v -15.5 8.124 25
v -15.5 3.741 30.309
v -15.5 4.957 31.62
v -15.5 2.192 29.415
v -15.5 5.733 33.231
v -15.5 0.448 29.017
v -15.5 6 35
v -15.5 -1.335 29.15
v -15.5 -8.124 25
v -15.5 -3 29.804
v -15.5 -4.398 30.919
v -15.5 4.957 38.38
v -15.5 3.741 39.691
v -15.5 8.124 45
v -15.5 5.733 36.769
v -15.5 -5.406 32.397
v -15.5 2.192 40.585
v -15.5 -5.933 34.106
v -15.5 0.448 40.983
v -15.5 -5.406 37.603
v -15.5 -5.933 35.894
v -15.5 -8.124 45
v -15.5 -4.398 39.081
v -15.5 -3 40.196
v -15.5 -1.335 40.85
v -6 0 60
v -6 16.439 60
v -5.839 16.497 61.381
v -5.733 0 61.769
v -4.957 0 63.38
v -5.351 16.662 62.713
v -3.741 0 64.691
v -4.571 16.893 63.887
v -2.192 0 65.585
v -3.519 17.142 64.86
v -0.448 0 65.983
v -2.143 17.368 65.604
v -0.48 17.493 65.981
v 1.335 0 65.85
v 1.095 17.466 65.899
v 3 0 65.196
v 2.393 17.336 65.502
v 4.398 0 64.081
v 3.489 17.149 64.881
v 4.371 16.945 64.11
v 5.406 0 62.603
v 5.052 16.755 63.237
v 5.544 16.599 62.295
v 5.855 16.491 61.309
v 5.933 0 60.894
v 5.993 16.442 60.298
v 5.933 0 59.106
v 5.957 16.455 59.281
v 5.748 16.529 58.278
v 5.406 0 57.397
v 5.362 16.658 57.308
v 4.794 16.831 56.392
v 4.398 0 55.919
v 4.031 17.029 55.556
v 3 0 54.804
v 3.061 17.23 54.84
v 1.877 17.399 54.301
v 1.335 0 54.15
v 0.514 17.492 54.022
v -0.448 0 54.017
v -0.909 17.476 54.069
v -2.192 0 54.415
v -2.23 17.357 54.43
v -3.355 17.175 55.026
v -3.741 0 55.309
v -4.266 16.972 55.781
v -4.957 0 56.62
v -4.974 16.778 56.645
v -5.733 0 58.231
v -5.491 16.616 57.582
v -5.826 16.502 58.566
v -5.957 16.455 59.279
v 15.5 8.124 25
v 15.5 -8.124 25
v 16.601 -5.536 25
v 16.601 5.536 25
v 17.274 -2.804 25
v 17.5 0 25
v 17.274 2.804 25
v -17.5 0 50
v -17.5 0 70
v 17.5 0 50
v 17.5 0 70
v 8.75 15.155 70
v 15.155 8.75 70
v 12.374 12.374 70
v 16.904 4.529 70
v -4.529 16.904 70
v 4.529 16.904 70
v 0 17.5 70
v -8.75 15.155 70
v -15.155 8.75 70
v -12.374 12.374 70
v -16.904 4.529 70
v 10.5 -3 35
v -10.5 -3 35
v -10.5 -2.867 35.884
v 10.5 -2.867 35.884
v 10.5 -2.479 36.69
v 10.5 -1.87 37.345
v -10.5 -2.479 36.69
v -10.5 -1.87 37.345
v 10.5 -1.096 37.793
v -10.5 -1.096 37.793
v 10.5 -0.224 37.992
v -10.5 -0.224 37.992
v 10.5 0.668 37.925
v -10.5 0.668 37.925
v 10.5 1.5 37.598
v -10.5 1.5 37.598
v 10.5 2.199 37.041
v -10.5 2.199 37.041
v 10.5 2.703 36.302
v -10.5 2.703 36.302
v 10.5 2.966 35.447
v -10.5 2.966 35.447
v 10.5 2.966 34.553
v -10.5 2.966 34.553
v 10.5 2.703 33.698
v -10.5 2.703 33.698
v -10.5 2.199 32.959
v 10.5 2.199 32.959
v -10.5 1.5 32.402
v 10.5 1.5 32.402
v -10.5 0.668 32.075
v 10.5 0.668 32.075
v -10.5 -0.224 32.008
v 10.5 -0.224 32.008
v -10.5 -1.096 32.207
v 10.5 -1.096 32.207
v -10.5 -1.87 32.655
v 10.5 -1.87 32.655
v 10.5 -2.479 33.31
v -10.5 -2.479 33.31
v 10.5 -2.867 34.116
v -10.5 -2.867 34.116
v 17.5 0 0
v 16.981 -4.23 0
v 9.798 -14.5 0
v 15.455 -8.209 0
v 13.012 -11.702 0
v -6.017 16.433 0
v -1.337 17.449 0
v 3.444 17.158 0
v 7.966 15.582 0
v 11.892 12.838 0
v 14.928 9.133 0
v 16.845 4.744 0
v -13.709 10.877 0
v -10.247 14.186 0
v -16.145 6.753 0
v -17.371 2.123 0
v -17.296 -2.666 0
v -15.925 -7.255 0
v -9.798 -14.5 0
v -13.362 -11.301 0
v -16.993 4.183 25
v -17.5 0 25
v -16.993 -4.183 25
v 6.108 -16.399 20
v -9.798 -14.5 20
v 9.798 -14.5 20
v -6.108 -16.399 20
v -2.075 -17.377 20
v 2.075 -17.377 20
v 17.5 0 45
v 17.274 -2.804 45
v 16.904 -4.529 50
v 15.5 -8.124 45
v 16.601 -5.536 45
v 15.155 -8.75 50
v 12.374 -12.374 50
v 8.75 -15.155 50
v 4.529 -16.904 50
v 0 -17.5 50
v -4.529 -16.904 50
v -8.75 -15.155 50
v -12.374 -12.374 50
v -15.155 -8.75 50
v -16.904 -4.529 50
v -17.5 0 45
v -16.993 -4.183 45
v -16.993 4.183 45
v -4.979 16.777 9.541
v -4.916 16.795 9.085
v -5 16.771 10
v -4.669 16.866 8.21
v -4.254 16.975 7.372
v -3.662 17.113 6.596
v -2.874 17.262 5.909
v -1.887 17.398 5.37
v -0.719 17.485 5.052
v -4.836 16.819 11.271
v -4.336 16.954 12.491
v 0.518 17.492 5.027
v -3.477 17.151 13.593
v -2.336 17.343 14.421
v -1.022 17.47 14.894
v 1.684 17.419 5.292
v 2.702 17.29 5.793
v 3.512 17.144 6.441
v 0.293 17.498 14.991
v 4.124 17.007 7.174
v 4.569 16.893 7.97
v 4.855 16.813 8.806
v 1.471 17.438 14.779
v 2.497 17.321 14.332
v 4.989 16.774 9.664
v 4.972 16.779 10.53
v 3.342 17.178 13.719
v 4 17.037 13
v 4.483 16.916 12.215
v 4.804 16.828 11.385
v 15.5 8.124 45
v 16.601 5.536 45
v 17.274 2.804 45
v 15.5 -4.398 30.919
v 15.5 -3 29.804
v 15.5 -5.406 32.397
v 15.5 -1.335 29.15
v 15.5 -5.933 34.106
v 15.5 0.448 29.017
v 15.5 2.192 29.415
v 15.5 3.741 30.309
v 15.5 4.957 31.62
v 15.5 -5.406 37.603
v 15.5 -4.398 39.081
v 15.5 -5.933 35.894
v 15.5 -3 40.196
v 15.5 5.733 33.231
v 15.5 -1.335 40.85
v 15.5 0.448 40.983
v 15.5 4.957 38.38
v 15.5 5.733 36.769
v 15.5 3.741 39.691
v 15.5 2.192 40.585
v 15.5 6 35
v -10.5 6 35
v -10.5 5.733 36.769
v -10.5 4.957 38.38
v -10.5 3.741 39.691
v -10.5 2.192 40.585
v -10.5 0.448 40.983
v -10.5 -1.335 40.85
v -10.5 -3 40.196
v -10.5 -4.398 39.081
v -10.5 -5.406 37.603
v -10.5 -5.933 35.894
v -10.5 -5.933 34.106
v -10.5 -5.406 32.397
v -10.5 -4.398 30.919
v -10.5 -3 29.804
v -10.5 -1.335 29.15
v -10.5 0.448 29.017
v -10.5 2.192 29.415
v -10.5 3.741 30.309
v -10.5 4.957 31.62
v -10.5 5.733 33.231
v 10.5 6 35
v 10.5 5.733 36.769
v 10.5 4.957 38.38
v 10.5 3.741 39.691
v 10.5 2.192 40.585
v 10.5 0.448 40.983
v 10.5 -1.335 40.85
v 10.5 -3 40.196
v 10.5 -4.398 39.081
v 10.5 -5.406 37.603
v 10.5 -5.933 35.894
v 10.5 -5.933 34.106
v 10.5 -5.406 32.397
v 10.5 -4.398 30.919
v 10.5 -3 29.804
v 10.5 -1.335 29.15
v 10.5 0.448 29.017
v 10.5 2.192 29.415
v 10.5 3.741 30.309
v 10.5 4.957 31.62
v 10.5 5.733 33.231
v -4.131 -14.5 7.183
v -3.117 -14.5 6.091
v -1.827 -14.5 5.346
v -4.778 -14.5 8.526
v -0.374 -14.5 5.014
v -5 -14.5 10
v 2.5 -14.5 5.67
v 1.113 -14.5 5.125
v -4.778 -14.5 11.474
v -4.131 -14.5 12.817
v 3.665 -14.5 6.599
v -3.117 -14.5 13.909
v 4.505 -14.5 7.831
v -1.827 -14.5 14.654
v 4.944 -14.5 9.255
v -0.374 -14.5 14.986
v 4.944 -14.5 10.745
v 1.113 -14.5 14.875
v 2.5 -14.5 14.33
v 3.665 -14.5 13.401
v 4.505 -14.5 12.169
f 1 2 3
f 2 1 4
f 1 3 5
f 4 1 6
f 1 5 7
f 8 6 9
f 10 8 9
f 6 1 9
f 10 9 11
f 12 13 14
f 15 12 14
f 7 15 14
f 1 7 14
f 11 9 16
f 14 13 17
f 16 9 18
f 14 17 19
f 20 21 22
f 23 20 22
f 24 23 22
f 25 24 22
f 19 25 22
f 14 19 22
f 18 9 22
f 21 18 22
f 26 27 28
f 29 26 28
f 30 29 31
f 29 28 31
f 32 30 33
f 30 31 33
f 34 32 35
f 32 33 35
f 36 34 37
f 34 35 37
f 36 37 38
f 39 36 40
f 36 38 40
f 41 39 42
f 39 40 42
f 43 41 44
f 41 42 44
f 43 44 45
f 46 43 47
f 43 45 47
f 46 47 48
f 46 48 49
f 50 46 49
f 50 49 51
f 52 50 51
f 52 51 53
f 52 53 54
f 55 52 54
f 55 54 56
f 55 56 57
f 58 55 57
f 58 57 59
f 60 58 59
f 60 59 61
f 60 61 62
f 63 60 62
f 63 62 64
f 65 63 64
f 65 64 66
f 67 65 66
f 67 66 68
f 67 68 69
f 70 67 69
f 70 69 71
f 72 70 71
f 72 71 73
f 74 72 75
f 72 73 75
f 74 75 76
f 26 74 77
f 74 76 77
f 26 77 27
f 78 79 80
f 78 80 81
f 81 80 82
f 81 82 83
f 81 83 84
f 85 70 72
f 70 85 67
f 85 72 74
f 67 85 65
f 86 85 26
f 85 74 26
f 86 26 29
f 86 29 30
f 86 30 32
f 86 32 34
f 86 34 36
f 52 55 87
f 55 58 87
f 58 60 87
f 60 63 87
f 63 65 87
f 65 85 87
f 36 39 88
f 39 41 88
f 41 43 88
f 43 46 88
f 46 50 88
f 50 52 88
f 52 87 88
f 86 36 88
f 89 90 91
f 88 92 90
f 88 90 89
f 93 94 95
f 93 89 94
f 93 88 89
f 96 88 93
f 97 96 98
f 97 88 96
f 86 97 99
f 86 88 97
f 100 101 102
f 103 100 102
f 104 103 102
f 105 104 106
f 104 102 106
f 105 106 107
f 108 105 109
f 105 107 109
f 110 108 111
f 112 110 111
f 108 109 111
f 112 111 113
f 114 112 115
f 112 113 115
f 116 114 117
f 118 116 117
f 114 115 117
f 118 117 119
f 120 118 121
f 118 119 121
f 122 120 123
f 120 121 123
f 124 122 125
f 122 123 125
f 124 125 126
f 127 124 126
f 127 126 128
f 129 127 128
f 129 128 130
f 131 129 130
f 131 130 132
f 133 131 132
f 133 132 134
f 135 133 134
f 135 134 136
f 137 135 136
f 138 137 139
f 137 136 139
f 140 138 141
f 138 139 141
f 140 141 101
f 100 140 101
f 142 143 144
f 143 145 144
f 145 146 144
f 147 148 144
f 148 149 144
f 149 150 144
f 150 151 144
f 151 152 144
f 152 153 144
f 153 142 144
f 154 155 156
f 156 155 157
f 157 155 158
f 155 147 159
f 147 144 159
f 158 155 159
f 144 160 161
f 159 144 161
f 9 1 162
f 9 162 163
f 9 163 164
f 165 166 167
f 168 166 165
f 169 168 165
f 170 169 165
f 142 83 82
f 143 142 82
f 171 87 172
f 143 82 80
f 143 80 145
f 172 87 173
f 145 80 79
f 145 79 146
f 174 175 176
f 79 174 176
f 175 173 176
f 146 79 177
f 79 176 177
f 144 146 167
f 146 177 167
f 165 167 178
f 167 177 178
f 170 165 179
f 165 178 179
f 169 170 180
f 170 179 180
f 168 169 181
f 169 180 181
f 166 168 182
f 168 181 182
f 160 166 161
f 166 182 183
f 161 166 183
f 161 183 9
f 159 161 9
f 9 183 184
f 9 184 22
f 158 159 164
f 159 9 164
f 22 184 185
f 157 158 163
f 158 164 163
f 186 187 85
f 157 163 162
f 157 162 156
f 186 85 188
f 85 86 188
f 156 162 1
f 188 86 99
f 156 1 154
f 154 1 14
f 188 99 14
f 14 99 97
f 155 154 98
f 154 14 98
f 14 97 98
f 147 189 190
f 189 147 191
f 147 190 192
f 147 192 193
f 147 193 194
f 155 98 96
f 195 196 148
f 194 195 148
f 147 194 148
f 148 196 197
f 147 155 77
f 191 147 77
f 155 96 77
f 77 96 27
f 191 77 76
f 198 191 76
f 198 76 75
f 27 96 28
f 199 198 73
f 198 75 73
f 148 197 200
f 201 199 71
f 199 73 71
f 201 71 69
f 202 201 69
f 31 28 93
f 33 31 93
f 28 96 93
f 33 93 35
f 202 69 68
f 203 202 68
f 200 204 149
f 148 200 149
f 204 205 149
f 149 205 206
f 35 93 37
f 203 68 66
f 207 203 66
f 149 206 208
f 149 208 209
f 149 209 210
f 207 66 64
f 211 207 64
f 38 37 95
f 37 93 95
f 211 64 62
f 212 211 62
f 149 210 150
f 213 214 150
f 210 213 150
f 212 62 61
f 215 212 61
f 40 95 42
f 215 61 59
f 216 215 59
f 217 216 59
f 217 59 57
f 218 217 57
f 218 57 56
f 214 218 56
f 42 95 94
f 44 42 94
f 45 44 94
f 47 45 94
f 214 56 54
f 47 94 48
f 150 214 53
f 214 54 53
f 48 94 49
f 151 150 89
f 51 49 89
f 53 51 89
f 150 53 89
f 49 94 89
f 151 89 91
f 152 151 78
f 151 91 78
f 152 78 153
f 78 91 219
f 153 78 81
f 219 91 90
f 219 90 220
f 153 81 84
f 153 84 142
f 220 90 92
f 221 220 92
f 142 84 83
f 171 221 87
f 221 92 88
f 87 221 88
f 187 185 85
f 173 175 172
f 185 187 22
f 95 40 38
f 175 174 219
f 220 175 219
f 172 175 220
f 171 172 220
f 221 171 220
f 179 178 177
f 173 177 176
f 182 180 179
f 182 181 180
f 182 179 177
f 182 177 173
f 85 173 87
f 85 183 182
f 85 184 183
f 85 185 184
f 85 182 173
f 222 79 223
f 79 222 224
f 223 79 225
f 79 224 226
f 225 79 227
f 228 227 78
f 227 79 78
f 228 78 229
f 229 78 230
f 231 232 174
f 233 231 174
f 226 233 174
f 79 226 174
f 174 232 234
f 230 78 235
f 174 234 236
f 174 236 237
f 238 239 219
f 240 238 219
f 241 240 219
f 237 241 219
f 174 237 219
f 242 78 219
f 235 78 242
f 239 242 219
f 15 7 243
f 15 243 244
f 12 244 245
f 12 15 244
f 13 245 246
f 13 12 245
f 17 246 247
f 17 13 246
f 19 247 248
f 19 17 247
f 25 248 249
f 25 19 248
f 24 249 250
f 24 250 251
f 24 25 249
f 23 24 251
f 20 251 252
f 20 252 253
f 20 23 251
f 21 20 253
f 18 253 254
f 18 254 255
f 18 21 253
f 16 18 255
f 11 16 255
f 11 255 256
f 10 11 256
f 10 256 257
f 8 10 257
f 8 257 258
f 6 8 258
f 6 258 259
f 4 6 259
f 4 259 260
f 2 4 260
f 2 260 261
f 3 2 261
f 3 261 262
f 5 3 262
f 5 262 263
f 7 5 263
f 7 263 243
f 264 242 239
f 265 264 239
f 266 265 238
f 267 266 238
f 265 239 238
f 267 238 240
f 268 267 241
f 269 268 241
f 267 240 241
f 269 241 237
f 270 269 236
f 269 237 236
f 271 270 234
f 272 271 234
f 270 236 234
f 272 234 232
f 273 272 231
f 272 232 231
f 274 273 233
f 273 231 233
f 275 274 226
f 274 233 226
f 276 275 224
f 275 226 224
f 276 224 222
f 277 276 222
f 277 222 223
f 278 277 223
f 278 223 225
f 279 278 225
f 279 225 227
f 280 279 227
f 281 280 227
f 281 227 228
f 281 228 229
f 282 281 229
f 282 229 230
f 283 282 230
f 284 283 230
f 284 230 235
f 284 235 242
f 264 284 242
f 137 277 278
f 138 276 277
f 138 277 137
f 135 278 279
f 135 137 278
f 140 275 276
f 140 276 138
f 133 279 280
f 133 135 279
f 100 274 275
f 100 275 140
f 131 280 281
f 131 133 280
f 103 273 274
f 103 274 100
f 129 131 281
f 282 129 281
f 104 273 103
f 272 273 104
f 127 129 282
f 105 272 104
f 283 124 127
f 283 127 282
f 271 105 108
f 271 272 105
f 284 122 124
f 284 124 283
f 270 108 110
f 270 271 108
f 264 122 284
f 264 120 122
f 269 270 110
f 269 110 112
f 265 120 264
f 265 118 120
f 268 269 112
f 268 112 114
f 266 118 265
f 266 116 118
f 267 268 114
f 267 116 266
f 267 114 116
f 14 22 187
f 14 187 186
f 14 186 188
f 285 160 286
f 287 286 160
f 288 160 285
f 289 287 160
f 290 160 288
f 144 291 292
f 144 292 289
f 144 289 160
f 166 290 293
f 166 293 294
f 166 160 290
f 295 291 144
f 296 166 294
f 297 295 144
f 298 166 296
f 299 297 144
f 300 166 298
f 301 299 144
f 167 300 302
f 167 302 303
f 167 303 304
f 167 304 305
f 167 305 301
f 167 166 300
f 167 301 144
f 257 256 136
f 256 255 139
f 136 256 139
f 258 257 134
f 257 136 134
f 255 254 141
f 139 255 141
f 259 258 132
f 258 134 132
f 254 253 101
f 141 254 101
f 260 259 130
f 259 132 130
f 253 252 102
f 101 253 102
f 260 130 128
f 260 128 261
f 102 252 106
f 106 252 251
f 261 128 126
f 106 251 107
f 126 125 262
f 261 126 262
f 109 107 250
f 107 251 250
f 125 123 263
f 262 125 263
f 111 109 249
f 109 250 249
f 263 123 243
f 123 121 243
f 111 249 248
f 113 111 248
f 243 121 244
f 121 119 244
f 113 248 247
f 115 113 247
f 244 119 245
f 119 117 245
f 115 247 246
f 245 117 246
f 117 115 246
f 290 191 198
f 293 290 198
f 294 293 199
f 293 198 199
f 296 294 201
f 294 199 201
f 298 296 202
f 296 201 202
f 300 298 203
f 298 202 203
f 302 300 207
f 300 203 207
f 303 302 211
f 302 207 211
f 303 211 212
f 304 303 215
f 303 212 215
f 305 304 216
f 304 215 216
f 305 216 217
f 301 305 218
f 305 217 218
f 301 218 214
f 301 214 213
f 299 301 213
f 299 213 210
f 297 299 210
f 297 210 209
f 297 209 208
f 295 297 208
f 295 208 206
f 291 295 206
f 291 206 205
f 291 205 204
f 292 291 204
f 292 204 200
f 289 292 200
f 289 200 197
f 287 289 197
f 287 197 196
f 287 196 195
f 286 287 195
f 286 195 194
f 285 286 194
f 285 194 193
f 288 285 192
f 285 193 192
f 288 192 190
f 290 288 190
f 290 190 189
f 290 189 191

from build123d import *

# Parameters (mm, degrees)
F0_W            = 17.5
F0_H            = 70
F2_W            = 17.5
F2_H            = 20
F3_DEPTH        = 17.501
F3_DEPTH_BACK   = 17.501
F5_D            = 12
F7_START        = 14.5
F6_W            = 35
F6_H            = 20
F7_DEPTH        = 3.0010001
F9_D            = 10
F10_W           = 2
F10_H           = 20
F11_DEPTH       = 17.5010001
F11_DEPTH_BACK  = 17.5010001
F13_D           = 6
F13_CBORE_D     = 12
F13_CBORE_DEPTH = 5


# Not quite as in the source:
# - a pattern or mirror of a feature is missing from the dataset's text; its kind, count and spacing are read off the source's solid


with BuildPart() as f1:
    # F0 (on Front) → F1 (revolve)
    with BuildSketch(Plane.XZ):
        with Locations((8.75, 35)):
            Rectangle(F0_W, F0_H)
    revolve(axis=Axis((0, 0, 35), (0, 0, -1)))

    # F2 (on Right) → F3 (cut, two sides)
    with BuildSketch(Plane.YZ) as f3_sk:
        with Locations((-8.75, 60)):
            Rectangle(F2_W, F2_H)
    extrude(amount=-F3_DEPTH, mode=Mode.SUBTRACT)
    extrude(f3_sk.sketch, amount=F3_DEPTH_BACK, mode=Mode.SUBTRACT)

    # F5 (through all)
    with Locations(Plane.XZ):
        with Locations((0, 60)):
            Hole(F5_D / 2)

    # F6 (on Front) → F7 (cut)
    with BuildSketch(Plane.XZ.offset(F7_START)):
        with Locations((0, 10)):
            Rectangle(F6_W, F6_H)
    extrude(amount=F7_DEPTH, mode=Mode.SUBTRACT)

    # F9 (through all)
    with Locations(Plane.XZ.offset(14.5)):
        with Locations((0, 10)):
            Hole(F9_D / 2)

    # F10 (on Front) → F11 (cut, two sides)
    with BuildSketch(Plane.XZ) as f11_sk:
        with Locations((-16.5, 35)):
            Rectangle(F10_W, F10_H)
        with Locations((16.5, 35)):
            Rectangle(F10_W, F10_H)
    extrude(amount=-F11_DEPTH, mode=Mode.SUBTRACT)
    extrude(f11_sk.sketch, amount=F11_DEPTH_BACK, mode=Mode.SUBTRACT)

    # F13 (through all)
    with Locations(Plane.YZ.offset(15.5)):
        with Locations((0, 35)):
            f13 = CounterBoreHole(F13_D / 2, F13_CBORE_D / 2, F13_CBORE_DEPTH)

    # F13_copies: F13 across plane
    add(f13.mirror(Plane(origin=(0, 0, 0), x_dir=(0, 0, -1), z_dir=(-1, 0, 0))), mode=Mode.SUBTRACT)


solid = f1.part
